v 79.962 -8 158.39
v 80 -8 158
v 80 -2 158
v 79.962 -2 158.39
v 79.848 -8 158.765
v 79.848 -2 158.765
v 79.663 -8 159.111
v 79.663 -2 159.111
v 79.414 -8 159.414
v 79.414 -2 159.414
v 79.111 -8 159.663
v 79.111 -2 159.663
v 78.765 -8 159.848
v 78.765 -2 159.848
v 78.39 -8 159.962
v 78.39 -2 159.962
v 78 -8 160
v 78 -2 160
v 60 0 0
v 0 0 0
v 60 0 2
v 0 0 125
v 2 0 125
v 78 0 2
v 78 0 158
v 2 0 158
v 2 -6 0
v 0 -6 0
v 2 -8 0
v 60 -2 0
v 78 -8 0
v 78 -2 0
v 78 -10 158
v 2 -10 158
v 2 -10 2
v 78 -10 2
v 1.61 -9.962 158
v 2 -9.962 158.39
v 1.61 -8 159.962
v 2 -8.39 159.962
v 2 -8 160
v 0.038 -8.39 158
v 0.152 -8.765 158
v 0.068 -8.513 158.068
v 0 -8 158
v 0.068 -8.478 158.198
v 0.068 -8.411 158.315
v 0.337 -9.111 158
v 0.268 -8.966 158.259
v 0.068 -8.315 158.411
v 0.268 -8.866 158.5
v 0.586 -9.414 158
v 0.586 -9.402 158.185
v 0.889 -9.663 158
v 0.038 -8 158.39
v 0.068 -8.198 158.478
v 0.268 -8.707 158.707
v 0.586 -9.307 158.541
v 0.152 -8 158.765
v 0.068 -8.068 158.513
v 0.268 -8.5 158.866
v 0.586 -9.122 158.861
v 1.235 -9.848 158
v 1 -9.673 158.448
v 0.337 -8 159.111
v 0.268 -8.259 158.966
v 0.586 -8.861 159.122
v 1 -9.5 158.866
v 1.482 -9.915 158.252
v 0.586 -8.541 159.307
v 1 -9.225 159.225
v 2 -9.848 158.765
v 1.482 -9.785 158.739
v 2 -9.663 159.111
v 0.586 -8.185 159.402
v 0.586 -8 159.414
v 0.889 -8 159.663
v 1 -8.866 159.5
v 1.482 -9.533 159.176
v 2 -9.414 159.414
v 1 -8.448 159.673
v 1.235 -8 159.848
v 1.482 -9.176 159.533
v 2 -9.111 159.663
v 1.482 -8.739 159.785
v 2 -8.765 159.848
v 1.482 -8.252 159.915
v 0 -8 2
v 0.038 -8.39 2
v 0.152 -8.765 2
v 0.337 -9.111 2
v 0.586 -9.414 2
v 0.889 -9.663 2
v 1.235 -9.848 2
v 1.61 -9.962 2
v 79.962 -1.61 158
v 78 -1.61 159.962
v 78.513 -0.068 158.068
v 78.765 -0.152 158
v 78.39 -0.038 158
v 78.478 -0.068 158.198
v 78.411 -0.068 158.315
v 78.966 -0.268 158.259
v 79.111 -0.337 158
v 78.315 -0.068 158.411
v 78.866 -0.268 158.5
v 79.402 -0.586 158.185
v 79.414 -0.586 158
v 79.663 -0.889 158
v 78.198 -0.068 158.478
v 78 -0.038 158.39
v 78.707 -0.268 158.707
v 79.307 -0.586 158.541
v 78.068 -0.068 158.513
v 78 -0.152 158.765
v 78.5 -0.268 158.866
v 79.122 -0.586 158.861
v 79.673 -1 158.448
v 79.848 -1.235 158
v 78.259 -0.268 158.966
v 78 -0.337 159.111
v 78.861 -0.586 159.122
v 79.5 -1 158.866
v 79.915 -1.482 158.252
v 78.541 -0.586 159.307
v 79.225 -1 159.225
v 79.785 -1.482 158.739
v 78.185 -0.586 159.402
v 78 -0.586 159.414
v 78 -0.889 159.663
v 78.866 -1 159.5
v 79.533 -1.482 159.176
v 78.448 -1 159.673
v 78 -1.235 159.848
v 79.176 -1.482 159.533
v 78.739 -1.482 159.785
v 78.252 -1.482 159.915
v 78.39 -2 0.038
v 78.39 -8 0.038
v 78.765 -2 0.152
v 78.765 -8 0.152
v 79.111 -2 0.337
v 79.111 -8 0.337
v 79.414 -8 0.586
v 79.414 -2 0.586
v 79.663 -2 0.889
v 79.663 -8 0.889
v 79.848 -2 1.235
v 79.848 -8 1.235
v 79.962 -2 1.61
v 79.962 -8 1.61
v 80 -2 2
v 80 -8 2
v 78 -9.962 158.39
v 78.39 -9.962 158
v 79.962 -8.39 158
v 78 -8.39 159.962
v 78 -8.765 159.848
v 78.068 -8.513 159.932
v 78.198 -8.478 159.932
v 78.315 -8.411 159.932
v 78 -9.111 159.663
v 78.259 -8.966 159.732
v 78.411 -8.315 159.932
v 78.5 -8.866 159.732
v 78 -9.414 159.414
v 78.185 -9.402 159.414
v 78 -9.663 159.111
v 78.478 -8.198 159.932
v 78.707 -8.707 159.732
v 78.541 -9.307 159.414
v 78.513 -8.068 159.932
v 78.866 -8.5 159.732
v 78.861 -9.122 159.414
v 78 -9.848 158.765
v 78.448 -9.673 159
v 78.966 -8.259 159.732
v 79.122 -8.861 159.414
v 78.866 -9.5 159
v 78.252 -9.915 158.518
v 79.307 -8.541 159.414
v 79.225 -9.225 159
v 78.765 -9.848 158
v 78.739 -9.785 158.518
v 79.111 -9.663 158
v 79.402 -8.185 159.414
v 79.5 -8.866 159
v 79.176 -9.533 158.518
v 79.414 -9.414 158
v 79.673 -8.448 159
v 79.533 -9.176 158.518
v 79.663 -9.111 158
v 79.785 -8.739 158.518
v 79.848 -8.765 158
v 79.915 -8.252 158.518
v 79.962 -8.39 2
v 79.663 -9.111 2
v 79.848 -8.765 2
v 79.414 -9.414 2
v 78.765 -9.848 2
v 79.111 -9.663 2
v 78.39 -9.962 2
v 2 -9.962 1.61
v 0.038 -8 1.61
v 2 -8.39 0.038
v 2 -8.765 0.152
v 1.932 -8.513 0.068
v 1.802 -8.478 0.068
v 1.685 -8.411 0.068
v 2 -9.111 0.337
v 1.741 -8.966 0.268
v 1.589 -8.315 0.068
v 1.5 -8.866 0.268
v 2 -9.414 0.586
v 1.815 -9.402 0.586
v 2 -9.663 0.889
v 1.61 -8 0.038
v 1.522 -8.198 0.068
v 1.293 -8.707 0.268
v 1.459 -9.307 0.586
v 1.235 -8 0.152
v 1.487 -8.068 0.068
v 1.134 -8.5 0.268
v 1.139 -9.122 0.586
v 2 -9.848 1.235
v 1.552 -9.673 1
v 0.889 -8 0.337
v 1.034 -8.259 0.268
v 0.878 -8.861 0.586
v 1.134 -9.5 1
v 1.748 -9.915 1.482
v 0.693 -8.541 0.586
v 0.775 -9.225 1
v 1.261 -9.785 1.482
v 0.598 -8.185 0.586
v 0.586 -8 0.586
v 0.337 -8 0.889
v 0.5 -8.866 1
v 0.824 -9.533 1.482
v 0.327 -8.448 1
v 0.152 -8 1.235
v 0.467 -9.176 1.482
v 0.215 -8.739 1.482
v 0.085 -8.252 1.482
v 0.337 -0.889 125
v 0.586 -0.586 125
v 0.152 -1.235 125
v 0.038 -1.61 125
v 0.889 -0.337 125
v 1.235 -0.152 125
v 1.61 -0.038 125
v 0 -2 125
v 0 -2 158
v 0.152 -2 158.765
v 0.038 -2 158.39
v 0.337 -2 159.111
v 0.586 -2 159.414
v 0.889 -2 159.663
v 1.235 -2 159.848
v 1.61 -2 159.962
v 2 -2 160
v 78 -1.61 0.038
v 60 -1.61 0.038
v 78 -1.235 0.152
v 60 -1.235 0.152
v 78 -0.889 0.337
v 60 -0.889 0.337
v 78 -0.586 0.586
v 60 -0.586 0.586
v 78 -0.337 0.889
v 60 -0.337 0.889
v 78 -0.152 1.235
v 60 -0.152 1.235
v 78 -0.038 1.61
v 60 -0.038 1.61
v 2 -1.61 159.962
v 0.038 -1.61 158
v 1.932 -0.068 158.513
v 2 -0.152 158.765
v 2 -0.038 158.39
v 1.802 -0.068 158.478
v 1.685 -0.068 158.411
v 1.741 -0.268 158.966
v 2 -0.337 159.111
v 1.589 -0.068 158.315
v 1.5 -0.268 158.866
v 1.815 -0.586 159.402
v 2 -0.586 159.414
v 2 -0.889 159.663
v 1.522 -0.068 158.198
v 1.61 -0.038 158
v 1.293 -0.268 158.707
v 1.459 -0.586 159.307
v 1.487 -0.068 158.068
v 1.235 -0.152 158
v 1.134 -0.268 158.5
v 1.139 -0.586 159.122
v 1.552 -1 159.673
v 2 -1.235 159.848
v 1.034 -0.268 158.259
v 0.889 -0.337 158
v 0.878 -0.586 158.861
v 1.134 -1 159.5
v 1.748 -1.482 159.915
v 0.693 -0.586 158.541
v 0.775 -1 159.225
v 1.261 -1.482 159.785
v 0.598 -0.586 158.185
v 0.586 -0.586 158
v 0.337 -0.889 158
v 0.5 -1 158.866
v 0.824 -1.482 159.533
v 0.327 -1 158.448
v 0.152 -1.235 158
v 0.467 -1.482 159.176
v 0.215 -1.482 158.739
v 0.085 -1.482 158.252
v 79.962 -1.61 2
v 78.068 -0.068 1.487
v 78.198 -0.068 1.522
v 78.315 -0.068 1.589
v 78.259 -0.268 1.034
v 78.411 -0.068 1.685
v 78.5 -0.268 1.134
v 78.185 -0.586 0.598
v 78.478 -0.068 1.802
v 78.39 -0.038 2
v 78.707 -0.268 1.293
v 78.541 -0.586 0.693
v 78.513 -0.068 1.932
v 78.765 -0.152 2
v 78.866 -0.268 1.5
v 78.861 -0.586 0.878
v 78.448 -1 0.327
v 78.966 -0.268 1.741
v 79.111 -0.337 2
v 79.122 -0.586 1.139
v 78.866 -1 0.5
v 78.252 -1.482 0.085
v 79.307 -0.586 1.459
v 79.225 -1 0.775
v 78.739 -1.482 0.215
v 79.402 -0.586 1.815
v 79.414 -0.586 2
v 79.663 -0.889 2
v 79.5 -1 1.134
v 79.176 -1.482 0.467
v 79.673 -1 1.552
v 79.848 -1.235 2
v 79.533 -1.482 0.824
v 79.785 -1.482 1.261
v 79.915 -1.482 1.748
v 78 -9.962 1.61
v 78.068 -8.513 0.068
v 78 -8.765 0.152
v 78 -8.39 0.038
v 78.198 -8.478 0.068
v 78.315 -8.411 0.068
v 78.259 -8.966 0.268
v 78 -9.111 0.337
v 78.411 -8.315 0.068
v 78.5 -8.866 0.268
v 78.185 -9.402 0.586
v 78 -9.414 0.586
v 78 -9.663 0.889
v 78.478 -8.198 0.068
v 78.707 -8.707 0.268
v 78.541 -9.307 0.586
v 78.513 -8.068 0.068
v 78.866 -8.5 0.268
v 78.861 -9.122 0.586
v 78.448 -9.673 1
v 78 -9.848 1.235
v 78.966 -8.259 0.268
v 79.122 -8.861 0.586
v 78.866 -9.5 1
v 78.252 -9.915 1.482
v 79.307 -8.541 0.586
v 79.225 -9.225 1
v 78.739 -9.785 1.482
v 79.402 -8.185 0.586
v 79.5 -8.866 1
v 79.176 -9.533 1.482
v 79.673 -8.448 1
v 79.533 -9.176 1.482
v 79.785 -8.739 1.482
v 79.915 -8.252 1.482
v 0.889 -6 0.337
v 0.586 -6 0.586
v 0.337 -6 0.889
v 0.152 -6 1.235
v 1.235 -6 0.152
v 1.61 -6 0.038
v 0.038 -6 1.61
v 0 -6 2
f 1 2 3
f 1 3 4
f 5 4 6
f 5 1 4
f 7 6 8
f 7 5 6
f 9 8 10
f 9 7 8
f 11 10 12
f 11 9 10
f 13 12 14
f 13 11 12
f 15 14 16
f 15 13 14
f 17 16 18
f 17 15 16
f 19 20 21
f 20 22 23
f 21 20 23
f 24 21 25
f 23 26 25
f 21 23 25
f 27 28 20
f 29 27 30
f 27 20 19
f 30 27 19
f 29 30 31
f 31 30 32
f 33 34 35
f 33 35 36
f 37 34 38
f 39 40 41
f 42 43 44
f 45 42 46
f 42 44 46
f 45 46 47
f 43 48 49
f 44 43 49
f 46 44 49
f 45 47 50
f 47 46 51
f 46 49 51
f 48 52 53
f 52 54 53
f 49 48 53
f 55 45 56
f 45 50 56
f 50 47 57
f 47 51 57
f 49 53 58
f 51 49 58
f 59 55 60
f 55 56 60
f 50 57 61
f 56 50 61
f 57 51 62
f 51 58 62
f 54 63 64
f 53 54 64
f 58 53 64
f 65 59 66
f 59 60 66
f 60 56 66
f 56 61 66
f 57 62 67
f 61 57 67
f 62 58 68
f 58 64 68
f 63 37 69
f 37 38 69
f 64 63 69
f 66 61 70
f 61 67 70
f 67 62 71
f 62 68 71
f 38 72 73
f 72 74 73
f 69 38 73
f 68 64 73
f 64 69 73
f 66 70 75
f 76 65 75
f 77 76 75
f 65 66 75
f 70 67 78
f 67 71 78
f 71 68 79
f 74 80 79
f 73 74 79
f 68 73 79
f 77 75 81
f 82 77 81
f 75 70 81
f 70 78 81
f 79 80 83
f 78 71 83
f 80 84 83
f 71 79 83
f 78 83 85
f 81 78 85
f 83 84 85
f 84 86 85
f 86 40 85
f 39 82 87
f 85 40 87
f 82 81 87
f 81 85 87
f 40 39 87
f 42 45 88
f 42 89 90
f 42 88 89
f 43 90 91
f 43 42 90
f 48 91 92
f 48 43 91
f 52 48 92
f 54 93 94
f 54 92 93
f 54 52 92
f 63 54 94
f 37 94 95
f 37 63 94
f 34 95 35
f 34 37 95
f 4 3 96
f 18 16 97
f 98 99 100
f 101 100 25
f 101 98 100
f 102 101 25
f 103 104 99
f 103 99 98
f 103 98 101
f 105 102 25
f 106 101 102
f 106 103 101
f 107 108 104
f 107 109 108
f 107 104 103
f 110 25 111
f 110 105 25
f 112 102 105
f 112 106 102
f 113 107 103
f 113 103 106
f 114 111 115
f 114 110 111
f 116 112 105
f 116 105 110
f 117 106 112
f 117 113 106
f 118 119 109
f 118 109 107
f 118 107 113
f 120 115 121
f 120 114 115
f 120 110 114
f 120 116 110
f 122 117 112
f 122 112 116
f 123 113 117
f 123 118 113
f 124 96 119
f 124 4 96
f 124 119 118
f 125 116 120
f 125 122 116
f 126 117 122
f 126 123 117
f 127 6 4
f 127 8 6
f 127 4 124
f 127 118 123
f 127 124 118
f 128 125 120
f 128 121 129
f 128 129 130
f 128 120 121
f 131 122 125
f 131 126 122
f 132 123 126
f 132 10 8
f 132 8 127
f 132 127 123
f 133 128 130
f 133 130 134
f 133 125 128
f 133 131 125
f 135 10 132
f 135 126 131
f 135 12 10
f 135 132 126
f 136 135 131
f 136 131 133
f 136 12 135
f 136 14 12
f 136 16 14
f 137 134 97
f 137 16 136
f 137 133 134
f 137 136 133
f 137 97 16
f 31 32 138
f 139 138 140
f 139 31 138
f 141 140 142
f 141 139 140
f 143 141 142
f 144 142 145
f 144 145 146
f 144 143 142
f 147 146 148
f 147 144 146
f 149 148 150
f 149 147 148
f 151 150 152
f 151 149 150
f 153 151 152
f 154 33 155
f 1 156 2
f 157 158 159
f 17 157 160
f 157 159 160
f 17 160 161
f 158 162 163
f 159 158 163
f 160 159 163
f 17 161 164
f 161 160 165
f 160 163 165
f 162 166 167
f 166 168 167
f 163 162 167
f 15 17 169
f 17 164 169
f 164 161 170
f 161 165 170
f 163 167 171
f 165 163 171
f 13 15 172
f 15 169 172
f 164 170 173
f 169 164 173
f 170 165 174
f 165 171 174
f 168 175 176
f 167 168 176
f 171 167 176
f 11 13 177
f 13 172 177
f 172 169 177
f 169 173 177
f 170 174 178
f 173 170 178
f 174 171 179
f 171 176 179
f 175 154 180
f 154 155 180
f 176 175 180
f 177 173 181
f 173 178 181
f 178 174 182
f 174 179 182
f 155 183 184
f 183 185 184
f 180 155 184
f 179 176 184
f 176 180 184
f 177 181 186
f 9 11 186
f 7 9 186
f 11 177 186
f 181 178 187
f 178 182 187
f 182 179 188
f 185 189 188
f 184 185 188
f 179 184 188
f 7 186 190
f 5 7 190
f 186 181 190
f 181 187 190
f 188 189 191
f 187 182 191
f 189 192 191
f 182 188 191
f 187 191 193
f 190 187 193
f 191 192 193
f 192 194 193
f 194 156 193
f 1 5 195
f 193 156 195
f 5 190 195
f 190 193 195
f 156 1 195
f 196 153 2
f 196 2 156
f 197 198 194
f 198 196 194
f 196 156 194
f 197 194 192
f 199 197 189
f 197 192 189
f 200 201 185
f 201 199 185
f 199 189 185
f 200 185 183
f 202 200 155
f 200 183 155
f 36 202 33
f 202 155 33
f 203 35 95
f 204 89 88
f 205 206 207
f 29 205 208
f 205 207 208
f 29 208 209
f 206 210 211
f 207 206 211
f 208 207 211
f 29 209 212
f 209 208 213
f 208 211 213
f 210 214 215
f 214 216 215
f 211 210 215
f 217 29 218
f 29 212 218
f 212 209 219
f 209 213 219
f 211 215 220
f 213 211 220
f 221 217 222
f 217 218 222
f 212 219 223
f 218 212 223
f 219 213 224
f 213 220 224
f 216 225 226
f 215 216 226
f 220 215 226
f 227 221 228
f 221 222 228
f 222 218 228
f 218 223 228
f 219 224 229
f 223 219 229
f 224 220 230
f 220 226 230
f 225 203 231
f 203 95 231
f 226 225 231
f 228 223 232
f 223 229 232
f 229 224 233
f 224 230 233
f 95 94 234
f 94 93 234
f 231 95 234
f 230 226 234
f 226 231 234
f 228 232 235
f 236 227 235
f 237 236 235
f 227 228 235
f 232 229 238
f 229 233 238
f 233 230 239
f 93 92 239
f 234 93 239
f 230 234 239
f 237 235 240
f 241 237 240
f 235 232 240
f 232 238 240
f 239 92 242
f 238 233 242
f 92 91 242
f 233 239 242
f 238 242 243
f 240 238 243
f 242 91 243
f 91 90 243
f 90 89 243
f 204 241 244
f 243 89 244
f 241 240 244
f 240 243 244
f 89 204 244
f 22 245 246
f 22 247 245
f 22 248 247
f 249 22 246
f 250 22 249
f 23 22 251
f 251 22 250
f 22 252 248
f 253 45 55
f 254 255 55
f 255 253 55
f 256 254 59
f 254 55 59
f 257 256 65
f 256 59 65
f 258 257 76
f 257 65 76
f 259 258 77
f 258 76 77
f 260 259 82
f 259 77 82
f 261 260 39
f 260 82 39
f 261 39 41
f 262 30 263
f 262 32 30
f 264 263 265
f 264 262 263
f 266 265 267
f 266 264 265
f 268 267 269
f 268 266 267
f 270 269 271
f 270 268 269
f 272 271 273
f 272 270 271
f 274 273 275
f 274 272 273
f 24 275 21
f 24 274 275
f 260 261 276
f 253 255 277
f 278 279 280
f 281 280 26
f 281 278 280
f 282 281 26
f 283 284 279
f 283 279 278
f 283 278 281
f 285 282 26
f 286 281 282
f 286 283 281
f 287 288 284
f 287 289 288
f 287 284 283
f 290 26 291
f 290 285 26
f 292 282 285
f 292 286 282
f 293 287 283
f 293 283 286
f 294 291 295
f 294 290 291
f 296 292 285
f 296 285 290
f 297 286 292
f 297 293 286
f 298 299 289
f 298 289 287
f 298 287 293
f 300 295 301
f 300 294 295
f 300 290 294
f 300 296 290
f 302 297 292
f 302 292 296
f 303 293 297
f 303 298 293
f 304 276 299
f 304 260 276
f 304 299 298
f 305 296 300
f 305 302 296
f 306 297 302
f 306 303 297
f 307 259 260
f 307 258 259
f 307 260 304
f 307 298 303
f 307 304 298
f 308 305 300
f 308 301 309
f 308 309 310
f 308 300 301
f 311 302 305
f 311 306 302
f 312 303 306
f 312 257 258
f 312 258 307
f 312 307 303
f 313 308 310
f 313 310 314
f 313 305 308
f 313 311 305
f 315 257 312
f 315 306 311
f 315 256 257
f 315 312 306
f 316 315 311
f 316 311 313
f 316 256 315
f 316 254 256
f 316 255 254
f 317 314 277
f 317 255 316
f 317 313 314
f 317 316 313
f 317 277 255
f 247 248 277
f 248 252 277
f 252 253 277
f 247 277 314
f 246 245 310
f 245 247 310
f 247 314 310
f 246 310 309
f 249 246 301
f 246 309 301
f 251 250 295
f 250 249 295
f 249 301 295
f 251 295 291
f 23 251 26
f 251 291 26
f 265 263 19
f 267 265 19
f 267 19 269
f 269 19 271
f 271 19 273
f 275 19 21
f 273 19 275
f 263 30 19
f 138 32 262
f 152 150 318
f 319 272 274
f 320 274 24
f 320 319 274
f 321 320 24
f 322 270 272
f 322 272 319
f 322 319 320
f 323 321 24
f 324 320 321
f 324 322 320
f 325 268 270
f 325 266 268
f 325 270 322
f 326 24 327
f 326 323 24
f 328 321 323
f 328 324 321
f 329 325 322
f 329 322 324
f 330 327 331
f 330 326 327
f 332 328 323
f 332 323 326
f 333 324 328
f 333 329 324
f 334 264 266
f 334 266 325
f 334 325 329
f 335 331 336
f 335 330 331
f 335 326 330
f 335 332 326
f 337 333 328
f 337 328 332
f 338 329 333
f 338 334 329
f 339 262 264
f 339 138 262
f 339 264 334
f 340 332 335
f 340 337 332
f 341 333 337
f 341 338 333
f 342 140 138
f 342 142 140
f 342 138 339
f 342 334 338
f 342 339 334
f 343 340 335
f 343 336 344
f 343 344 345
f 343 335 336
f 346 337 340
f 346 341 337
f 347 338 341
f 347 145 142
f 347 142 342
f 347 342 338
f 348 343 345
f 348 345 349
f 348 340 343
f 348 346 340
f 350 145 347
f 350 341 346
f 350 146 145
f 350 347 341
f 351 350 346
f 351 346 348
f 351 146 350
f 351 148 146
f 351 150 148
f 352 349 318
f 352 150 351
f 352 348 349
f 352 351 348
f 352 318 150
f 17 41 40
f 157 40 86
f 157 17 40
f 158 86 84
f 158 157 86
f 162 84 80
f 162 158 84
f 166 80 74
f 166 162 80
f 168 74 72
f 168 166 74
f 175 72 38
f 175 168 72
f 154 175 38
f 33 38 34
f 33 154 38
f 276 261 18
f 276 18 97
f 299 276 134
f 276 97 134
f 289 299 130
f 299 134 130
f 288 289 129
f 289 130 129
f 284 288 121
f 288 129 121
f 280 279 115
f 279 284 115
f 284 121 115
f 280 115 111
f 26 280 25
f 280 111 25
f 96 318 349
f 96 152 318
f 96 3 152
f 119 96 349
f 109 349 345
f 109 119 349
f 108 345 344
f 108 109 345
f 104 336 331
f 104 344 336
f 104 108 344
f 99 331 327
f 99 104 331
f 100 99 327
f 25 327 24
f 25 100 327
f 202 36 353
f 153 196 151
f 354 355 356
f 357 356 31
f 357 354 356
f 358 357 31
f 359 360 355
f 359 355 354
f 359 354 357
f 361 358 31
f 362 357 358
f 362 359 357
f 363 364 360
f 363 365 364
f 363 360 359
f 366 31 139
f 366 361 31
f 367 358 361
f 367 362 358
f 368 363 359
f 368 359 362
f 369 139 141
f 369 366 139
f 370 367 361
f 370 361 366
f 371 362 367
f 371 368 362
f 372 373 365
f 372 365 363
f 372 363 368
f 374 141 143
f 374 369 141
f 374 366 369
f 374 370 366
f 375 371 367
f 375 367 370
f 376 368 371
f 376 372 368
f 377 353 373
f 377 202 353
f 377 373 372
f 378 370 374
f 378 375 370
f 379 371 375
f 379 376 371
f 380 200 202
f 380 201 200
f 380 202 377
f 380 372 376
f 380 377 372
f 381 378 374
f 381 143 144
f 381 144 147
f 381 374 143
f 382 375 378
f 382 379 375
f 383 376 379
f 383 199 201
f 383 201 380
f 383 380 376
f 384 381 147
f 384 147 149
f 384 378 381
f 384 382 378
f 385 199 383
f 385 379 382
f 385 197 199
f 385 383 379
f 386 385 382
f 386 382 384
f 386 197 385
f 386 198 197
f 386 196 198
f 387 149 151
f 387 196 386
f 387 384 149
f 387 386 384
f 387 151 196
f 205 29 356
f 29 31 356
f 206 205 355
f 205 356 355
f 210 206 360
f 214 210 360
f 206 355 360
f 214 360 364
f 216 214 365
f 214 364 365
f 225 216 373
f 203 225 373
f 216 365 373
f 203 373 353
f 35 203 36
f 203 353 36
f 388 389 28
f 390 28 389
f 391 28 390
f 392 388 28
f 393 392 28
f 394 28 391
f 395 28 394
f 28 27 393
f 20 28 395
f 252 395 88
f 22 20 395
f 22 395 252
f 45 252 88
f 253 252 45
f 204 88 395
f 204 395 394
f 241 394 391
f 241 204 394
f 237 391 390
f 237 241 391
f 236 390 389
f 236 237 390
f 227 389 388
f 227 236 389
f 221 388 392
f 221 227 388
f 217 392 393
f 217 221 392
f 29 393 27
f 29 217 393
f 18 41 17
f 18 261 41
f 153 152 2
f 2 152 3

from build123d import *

# Parameters (mm, degrees)
F0_W     = 80
F0_H     = 160
F1_DEPTH = 10
F2_R     = 2
F3_W     = 60
F3_H     = 125
F4_DEPTH = 6


with BuildPart() as f1:
    # F0 (on Front) → F1 (new body)
    with BuildSketch(Plane.XZ):
        with Locations((40, 80)):
            Rectangle(F0_W, F0_H)
    extrude(amount=F1_DEPTH)

    # F2
    f2_edges = [f1.edges().sort_by_distance(p)[0] for p in [
        (80, -10, 80),
        (40, -10, 160),
        (0, -10, 80),
        (40, -10, 0),
        (0, -5, 160),
        (80, -5, 160),
        (80, -5, 0),
        (0, -5, 0),
        (40, 0, 0),
        (80, 0, 80),
        (40, 0, 160),
        (0, 0, 80),
    ]]
    fillet(f2_edges, radius=F2_R)

    # F3 (on Front) → F4 (join)
    with BuildSketch(Plane.XZ):
        with Locations((30, 62.5)):
            Rectangle(F3_W, F3_H)
    extrude(amount=F4_DEPTH)


solid = f1.part
